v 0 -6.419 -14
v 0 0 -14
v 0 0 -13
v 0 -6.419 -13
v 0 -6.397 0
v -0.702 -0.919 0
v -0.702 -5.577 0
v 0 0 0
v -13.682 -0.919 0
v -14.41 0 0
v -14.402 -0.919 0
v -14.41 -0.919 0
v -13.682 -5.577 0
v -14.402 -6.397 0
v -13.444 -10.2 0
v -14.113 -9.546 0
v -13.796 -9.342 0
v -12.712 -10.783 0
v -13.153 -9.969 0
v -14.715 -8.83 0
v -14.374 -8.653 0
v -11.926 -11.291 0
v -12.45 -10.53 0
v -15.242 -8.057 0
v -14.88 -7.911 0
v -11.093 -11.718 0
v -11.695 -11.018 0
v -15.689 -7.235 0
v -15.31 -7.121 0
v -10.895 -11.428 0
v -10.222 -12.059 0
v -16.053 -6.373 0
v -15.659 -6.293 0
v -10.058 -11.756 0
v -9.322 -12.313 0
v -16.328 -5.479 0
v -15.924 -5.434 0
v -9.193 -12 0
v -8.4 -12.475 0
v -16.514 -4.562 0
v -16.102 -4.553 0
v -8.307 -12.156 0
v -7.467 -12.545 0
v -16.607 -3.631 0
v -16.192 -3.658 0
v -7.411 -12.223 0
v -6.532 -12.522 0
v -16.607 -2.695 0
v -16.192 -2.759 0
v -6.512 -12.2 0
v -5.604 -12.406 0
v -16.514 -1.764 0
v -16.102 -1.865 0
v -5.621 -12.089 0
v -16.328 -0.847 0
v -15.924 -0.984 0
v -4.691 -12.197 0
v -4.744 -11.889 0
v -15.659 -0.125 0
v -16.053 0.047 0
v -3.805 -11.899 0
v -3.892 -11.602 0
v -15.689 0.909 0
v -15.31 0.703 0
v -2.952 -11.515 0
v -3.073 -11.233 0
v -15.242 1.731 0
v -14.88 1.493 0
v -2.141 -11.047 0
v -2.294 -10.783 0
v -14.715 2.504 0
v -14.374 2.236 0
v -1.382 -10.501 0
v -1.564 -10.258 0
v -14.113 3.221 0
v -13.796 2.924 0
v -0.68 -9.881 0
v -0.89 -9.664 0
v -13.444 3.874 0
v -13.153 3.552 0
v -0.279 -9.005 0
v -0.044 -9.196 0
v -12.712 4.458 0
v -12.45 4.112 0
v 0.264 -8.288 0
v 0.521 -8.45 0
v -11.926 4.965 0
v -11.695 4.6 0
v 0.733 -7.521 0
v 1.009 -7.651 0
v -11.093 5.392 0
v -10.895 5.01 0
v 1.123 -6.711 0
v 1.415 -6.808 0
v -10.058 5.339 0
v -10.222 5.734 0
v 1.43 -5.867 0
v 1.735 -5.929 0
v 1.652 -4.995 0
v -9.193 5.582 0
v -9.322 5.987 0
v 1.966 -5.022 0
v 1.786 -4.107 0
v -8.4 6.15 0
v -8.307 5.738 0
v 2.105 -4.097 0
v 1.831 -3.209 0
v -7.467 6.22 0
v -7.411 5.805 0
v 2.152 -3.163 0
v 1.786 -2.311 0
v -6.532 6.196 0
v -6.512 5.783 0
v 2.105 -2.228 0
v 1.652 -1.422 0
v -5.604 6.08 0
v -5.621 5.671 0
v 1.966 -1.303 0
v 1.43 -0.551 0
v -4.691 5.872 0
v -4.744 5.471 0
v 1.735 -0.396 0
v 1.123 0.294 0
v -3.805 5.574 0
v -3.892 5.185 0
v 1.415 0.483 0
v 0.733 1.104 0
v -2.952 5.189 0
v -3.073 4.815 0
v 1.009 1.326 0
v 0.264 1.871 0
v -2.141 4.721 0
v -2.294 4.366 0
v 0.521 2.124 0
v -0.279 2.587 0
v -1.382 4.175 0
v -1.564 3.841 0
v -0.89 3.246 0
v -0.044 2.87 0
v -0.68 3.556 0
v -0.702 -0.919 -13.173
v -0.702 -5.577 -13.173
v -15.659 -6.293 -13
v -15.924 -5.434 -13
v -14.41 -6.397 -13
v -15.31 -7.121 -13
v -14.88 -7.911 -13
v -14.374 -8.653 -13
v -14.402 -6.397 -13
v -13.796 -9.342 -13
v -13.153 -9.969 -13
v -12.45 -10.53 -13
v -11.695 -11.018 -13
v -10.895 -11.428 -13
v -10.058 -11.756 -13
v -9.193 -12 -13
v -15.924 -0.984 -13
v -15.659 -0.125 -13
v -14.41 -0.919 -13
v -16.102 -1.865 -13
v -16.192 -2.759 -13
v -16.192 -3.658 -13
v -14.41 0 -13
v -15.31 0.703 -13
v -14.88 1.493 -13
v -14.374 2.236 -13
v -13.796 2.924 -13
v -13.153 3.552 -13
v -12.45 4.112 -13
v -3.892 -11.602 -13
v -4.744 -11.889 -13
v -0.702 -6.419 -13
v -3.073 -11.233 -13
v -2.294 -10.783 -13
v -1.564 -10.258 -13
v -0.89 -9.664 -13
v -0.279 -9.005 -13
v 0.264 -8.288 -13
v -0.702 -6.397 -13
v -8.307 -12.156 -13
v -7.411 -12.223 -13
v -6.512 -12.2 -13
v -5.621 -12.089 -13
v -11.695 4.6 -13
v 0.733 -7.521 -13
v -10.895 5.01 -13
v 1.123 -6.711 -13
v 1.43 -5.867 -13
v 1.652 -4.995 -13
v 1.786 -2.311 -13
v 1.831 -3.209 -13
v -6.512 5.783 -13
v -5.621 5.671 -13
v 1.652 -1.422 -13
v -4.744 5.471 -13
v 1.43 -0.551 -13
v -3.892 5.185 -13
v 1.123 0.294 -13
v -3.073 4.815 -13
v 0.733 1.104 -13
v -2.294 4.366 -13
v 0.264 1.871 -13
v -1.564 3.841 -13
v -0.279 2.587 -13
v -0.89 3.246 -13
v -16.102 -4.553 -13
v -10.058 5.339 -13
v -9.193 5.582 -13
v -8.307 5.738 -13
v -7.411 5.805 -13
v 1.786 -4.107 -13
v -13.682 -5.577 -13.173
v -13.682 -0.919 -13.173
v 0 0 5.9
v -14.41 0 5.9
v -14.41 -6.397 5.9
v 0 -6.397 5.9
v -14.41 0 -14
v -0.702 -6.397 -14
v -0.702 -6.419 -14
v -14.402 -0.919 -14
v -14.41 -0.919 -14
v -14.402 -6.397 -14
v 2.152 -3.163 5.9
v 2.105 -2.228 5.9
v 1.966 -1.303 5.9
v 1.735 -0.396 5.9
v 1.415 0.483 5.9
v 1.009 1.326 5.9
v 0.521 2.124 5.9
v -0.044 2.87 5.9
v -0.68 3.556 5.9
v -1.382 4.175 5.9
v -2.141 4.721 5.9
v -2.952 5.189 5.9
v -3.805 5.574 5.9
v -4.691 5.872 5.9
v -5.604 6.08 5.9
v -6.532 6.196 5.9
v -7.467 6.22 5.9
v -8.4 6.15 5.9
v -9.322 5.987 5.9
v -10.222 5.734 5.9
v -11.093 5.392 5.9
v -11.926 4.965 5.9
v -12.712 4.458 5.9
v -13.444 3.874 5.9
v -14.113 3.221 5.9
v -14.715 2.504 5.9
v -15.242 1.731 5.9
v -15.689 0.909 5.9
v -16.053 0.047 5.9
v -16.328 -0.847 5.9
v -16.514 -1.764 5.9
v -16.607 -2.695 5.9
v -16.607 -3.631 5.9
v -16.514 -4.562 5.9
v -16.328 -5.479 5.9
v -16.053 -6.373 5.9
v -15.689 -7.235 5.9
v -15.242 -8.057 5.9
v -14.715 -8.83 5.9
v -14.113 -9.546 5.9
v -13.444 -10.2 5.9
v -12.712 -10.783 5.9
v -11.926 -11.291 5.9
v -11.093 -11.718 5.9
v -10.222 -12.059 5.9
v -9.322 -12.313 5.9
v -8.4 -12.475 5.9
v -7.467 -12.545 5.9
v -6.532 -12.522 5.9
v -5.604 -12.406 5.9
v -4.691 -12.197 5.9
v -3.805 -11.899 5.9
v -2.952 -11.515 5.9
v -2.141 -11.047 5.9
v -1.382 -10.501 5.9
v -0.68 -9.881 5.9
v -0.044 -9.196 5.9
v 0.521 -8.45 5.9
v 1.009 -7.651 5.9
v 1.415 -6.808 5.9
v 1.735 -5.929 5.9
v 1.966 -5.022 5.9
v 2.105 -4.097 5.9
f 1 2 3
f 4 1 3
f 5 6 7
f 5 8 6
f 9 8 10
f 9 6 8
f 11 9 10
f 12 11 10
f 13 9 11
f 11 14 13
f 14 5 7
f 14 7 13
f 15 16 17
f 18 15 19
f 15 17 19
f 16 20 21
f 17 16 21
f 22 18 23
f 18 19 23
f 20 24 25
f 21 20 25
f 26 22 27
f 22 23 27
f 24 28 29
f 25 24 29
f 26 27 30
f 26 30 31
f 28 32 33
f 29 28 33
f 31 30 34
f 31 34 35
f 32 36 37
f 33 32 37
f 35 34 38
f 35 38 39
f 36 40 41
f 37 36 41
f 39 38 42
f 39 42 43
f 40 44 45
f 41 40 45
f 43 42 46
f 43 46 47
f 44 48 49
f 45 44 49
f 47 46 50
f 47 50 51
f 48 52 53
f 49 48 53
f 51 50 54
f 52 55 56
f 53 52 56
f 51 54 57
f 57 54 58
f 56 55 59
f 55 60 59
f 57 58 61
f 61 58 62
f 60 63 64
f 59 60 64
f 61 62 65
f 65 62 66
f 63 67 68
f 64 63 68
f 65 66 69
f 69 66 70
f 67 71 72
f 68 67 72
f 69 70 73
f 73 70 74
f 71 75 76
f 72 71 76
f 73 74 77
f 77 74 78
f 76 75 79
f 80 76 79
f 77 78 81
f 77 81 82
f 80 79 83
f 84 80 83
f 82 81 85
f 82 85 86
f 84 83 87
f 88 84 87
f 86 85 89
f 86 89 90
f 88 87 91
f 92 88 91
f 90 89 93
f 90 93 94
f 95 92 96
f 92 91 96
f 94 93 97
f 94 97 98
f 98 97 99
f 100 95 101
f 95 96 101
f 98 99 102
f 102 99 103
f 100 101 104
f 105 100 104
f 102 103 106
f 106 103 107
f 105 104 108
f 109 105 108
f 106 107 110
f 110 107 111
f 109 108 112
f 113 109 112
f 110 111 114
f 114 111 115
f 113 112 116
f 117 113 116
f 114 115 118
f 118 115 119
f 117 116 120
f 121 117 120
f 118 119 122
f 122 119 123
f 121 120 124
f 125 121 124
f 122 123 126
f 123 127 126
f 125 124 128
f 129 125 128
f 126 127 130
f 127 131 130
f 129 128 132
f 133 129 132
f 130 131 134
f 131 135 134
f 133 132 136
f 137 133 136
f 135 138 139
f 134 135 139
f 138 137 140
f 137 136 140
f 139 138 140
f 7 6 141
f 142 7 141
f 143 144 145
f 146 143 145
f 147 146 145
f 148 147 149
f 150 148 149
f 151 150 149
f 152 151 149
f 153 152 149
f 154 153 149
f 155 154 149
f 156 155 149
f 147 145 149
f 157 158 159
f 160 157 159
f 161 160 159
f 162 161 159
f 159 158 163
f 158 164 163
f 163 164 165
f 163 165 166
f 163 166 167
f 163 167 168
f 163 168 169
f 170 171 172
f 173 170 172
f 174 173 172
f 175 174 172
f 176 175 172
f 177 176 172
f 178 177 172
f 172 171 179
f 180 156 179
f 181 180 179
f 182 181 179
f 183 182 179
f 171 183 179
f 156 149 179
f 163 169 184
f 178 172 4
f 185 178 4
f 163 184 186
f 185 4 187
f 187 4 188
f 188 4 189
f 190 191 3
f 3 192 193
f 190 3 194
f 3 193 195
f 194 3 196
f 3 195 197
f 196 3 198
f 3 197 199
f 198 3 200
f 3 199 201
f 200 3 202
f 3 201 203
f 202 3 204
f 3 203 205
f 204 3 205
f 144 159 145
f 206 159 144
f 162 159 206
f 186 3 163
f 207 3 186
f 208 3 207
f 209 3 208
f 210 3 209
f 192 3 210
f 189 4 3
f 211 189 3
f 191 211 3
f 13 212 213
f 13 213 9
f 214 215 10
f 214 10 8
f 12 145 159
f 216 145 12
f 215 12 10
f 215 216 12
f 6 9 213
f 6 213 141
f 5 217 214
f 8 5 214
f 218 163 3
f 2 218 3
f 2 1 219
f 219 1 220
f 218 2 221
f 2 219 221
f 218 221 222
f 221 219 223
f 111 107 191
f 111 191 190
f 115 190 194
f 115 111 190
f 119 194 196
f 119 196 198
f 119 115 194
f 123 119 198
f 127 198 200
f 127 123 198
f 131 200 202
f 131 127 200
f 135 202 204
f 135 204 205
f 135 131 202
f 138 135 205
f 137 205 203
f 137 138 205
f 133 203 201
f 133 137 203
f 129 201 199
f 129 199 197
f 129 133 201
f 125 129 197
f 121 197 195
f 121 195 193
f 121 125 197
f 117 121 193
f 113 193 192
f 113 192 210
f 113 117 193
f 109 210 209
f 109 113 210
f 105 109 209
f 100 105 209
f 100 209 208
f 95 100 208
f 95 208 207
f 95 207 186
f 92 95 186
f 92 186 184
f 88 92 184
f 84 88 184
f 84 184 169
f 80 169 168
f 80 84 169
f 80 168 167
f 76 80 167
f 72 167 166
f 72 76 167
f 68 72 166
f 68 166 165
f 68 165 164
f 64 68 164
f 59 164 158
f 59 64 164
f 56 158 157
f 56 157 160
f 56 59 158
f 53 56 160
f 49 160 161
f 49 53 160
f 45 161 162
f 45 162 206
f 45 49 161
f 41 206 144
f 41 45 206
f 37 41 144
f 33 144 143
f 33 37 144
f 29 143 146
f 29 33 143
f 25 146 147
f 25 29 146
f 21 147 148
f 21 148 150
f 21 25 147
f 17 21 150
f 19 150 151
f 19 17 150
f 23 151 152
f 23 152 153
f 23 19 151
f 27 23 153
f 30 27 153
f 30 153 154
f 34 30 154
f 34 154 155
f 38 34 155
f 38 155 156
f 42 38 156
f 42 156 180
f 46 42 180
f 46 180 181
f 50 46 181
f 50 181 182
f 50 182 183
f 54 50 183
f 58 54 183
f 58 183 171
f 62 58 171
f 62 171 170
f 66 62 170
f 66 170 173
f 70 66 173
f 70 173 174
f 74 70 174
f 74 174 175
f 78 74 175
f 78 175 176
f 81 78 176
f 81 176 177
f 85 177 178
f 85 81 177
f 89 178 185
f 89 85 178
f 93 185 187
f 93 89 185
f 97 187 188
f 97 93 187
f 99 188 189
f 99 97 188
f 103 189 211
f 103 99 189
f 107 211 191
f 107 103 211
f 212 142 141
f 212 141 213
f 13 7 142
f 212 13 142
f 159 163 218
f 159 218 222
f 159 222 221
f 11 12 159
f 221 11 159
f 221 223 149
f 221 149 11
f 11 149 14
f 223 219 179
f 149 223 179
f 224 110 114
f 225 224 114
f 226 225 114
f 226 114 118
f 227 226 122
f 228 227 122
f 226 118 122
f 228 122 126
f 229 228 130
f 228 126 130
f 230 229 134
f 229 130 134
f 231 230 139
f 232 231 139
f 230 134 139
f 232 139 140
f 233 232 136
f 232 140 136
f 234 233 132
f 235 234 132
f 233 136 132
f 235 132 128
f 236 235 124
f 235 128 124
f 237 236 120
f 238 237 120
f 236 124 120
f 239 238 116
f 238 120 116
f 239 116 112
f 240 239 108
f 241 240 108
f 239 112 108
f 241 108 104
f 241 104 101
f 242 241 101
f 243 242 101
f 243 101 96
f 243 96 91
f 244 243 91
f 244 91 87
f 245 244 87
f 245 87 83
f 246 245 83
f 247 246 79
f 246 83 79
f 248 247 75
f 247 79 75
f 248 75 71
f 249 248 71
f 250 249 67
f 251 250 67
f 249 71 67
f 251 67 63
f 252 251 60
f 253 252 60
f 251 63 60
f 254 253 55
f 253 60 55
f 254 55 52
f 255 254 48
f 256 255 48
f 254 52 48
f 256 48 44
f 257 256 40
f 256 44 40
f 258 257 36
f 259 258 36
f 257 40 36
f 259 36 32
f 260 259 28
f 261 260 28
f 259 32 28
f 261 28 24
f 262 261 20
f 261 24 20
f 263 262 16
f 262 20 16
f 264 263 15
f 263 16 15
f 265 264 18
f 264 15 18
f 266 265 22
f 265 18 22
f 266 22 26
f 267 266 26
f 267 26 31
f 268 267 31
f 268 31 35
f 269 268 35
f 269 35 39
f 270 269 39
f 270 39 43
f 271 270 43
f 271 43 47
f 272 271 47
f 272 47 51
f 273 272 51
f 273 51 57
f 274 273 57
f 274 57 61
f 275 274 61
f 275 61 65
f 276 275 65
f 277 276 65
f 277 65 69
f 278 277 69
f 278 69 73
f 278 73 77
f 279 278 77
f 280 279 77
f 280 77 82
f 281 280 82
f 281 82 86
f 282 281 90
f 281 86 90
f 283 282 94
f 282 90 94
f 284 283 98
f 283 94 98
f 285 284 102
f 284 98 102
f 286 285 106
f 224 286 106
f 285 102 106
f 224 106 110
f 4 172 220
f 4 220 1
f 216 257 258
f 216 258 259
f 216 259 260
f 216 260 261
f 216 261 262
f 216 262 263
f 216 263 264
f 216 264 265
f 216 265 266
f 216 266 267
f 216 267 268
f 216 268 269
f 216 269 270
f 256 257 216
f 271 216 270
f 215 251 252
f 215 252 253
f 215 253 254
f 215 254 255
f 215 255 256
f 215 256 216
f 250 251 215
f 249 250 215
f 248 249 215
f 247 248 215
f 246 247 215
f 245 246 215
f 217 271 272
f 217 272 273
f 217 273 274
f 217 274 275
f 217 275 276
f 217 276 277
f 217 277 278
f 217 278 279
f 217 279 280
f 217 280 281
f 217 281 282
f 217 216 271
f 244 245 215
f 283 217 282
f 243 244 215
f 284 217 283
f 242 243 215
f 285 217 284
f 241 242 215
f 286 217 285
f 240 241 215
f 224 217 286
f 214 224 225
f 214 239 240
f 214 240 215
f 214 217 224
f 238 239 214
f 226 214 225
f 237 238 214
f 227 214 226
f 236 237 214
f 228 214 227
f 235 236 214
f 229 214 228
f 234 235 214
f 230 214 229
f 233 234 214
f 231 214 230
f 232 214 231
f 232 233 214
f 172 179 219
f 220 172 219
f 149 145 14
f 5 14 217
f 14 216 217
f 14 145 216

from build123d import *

# Parameters (mm, degrees)
F1_R      = 9.3853456038
F1_W      = 14.4104864448
F1_H      = 6.3965022564
F2_DEPTH  = 5.9
F4_R      = 9.0168673832
F4_W      = 14.4104864448
F4_H      = 6.3965022564
F5_DEPTH  = 13
F3_W      = 14.4104864448
F3_H      = 0.9191088029
F6_DEPTH  = 14
F8_DEPTH  = 5.5
F10_DEPTH = 13.7
F11_W     = 0.7204534382
F11_H     = 14
F12_DEPTH = 5
F13_W     = 12.9795465618
F13_H     = 0.8269683793
F14_DEPTH = 5


with BuildPart() as f2:
    # F1 (on face) → F2 (new body)
    with BuildSketch(Plane.XY):
        with Locations((-7.2333719581, -3.1627740245)):
            Circle(F1_R)
        with Locations((-7.2052432224, -3.1982511282)):
            Rectangle(F1_W, F1_H, mode=Mode.SUBTRACT)
    extrude(amount=F2_DEPTH)

    # F4 (on face) → F5 (join)
    with BuildSketch(Plane.XY):
        with Locations((-7.186296396, -3.2088013832)):
            Circle(F4_R)
        with Locations((-7.2052432224, -3.1982511282)):
            Rectangle(F4_W, F4_H, mode=Mode.SUBTRACT)
    extrude(amount=-F5_DEPTH)

    # F3 (on face) → F6 (join)
    with BuildSketch(Plane(origin=(0, 0, 0), x_dir=(1, 0, 0), z_dir=(0, 0, -1))):
        with Locations((-7.2052432224, 0.4595544015)):
            Rectangle(F3_W, F3_H)
    extrude(amount=F6_DEPTH)

    # F7 (on face) → F8 (join)
    with BuildSketch(Plane.XZ.offset(0.9191088029)):
        Polygon((-0.701982528, -14), (0, -14), (0, -13), (0, 0), (-0.701982528, 0), align=None)
    extrude(amount=F8_DEPTH)

    # F9 (on face) → F10 (join)
    with BuildSketch(Plane(origin=(-0.701982528, 0, 0), x_dir=(0, -1, 0), z_dir=(-1, 0, 0))):
        Polygon((6.3965022564, -13), (6.3965022564, 0), (5.576975178, 0), (5.576975178, -14), (6.3965022564, -14), align=None)
    extrude(amount=F10_DEPTH)

    # F11 (on face) → F12 (join)
    with BuildSketch(Plane(origin=(0, -5.576975178, 0), x_dir=(-1, 0, 0), z_dir=(0, 1, 0))):
        with Locations((14.0417558089, -7)):
            Rectangle(F11_W, F11_H)
    extrude(amount=F12_DEPTH)

    # F13 (on face) → F14 (join)
    with BuildSketch(Plane(origin=(0, -5.576975178, 0), x_dir=(-1, 0, 0), z_dir=(0, 1, 0))):
        with Locations((7.1917558089, -13.5865158103)):
            Rectangle(F13_W, F13_H)
    extrude(amount=F14_DEPTH)


solid = f2.part
